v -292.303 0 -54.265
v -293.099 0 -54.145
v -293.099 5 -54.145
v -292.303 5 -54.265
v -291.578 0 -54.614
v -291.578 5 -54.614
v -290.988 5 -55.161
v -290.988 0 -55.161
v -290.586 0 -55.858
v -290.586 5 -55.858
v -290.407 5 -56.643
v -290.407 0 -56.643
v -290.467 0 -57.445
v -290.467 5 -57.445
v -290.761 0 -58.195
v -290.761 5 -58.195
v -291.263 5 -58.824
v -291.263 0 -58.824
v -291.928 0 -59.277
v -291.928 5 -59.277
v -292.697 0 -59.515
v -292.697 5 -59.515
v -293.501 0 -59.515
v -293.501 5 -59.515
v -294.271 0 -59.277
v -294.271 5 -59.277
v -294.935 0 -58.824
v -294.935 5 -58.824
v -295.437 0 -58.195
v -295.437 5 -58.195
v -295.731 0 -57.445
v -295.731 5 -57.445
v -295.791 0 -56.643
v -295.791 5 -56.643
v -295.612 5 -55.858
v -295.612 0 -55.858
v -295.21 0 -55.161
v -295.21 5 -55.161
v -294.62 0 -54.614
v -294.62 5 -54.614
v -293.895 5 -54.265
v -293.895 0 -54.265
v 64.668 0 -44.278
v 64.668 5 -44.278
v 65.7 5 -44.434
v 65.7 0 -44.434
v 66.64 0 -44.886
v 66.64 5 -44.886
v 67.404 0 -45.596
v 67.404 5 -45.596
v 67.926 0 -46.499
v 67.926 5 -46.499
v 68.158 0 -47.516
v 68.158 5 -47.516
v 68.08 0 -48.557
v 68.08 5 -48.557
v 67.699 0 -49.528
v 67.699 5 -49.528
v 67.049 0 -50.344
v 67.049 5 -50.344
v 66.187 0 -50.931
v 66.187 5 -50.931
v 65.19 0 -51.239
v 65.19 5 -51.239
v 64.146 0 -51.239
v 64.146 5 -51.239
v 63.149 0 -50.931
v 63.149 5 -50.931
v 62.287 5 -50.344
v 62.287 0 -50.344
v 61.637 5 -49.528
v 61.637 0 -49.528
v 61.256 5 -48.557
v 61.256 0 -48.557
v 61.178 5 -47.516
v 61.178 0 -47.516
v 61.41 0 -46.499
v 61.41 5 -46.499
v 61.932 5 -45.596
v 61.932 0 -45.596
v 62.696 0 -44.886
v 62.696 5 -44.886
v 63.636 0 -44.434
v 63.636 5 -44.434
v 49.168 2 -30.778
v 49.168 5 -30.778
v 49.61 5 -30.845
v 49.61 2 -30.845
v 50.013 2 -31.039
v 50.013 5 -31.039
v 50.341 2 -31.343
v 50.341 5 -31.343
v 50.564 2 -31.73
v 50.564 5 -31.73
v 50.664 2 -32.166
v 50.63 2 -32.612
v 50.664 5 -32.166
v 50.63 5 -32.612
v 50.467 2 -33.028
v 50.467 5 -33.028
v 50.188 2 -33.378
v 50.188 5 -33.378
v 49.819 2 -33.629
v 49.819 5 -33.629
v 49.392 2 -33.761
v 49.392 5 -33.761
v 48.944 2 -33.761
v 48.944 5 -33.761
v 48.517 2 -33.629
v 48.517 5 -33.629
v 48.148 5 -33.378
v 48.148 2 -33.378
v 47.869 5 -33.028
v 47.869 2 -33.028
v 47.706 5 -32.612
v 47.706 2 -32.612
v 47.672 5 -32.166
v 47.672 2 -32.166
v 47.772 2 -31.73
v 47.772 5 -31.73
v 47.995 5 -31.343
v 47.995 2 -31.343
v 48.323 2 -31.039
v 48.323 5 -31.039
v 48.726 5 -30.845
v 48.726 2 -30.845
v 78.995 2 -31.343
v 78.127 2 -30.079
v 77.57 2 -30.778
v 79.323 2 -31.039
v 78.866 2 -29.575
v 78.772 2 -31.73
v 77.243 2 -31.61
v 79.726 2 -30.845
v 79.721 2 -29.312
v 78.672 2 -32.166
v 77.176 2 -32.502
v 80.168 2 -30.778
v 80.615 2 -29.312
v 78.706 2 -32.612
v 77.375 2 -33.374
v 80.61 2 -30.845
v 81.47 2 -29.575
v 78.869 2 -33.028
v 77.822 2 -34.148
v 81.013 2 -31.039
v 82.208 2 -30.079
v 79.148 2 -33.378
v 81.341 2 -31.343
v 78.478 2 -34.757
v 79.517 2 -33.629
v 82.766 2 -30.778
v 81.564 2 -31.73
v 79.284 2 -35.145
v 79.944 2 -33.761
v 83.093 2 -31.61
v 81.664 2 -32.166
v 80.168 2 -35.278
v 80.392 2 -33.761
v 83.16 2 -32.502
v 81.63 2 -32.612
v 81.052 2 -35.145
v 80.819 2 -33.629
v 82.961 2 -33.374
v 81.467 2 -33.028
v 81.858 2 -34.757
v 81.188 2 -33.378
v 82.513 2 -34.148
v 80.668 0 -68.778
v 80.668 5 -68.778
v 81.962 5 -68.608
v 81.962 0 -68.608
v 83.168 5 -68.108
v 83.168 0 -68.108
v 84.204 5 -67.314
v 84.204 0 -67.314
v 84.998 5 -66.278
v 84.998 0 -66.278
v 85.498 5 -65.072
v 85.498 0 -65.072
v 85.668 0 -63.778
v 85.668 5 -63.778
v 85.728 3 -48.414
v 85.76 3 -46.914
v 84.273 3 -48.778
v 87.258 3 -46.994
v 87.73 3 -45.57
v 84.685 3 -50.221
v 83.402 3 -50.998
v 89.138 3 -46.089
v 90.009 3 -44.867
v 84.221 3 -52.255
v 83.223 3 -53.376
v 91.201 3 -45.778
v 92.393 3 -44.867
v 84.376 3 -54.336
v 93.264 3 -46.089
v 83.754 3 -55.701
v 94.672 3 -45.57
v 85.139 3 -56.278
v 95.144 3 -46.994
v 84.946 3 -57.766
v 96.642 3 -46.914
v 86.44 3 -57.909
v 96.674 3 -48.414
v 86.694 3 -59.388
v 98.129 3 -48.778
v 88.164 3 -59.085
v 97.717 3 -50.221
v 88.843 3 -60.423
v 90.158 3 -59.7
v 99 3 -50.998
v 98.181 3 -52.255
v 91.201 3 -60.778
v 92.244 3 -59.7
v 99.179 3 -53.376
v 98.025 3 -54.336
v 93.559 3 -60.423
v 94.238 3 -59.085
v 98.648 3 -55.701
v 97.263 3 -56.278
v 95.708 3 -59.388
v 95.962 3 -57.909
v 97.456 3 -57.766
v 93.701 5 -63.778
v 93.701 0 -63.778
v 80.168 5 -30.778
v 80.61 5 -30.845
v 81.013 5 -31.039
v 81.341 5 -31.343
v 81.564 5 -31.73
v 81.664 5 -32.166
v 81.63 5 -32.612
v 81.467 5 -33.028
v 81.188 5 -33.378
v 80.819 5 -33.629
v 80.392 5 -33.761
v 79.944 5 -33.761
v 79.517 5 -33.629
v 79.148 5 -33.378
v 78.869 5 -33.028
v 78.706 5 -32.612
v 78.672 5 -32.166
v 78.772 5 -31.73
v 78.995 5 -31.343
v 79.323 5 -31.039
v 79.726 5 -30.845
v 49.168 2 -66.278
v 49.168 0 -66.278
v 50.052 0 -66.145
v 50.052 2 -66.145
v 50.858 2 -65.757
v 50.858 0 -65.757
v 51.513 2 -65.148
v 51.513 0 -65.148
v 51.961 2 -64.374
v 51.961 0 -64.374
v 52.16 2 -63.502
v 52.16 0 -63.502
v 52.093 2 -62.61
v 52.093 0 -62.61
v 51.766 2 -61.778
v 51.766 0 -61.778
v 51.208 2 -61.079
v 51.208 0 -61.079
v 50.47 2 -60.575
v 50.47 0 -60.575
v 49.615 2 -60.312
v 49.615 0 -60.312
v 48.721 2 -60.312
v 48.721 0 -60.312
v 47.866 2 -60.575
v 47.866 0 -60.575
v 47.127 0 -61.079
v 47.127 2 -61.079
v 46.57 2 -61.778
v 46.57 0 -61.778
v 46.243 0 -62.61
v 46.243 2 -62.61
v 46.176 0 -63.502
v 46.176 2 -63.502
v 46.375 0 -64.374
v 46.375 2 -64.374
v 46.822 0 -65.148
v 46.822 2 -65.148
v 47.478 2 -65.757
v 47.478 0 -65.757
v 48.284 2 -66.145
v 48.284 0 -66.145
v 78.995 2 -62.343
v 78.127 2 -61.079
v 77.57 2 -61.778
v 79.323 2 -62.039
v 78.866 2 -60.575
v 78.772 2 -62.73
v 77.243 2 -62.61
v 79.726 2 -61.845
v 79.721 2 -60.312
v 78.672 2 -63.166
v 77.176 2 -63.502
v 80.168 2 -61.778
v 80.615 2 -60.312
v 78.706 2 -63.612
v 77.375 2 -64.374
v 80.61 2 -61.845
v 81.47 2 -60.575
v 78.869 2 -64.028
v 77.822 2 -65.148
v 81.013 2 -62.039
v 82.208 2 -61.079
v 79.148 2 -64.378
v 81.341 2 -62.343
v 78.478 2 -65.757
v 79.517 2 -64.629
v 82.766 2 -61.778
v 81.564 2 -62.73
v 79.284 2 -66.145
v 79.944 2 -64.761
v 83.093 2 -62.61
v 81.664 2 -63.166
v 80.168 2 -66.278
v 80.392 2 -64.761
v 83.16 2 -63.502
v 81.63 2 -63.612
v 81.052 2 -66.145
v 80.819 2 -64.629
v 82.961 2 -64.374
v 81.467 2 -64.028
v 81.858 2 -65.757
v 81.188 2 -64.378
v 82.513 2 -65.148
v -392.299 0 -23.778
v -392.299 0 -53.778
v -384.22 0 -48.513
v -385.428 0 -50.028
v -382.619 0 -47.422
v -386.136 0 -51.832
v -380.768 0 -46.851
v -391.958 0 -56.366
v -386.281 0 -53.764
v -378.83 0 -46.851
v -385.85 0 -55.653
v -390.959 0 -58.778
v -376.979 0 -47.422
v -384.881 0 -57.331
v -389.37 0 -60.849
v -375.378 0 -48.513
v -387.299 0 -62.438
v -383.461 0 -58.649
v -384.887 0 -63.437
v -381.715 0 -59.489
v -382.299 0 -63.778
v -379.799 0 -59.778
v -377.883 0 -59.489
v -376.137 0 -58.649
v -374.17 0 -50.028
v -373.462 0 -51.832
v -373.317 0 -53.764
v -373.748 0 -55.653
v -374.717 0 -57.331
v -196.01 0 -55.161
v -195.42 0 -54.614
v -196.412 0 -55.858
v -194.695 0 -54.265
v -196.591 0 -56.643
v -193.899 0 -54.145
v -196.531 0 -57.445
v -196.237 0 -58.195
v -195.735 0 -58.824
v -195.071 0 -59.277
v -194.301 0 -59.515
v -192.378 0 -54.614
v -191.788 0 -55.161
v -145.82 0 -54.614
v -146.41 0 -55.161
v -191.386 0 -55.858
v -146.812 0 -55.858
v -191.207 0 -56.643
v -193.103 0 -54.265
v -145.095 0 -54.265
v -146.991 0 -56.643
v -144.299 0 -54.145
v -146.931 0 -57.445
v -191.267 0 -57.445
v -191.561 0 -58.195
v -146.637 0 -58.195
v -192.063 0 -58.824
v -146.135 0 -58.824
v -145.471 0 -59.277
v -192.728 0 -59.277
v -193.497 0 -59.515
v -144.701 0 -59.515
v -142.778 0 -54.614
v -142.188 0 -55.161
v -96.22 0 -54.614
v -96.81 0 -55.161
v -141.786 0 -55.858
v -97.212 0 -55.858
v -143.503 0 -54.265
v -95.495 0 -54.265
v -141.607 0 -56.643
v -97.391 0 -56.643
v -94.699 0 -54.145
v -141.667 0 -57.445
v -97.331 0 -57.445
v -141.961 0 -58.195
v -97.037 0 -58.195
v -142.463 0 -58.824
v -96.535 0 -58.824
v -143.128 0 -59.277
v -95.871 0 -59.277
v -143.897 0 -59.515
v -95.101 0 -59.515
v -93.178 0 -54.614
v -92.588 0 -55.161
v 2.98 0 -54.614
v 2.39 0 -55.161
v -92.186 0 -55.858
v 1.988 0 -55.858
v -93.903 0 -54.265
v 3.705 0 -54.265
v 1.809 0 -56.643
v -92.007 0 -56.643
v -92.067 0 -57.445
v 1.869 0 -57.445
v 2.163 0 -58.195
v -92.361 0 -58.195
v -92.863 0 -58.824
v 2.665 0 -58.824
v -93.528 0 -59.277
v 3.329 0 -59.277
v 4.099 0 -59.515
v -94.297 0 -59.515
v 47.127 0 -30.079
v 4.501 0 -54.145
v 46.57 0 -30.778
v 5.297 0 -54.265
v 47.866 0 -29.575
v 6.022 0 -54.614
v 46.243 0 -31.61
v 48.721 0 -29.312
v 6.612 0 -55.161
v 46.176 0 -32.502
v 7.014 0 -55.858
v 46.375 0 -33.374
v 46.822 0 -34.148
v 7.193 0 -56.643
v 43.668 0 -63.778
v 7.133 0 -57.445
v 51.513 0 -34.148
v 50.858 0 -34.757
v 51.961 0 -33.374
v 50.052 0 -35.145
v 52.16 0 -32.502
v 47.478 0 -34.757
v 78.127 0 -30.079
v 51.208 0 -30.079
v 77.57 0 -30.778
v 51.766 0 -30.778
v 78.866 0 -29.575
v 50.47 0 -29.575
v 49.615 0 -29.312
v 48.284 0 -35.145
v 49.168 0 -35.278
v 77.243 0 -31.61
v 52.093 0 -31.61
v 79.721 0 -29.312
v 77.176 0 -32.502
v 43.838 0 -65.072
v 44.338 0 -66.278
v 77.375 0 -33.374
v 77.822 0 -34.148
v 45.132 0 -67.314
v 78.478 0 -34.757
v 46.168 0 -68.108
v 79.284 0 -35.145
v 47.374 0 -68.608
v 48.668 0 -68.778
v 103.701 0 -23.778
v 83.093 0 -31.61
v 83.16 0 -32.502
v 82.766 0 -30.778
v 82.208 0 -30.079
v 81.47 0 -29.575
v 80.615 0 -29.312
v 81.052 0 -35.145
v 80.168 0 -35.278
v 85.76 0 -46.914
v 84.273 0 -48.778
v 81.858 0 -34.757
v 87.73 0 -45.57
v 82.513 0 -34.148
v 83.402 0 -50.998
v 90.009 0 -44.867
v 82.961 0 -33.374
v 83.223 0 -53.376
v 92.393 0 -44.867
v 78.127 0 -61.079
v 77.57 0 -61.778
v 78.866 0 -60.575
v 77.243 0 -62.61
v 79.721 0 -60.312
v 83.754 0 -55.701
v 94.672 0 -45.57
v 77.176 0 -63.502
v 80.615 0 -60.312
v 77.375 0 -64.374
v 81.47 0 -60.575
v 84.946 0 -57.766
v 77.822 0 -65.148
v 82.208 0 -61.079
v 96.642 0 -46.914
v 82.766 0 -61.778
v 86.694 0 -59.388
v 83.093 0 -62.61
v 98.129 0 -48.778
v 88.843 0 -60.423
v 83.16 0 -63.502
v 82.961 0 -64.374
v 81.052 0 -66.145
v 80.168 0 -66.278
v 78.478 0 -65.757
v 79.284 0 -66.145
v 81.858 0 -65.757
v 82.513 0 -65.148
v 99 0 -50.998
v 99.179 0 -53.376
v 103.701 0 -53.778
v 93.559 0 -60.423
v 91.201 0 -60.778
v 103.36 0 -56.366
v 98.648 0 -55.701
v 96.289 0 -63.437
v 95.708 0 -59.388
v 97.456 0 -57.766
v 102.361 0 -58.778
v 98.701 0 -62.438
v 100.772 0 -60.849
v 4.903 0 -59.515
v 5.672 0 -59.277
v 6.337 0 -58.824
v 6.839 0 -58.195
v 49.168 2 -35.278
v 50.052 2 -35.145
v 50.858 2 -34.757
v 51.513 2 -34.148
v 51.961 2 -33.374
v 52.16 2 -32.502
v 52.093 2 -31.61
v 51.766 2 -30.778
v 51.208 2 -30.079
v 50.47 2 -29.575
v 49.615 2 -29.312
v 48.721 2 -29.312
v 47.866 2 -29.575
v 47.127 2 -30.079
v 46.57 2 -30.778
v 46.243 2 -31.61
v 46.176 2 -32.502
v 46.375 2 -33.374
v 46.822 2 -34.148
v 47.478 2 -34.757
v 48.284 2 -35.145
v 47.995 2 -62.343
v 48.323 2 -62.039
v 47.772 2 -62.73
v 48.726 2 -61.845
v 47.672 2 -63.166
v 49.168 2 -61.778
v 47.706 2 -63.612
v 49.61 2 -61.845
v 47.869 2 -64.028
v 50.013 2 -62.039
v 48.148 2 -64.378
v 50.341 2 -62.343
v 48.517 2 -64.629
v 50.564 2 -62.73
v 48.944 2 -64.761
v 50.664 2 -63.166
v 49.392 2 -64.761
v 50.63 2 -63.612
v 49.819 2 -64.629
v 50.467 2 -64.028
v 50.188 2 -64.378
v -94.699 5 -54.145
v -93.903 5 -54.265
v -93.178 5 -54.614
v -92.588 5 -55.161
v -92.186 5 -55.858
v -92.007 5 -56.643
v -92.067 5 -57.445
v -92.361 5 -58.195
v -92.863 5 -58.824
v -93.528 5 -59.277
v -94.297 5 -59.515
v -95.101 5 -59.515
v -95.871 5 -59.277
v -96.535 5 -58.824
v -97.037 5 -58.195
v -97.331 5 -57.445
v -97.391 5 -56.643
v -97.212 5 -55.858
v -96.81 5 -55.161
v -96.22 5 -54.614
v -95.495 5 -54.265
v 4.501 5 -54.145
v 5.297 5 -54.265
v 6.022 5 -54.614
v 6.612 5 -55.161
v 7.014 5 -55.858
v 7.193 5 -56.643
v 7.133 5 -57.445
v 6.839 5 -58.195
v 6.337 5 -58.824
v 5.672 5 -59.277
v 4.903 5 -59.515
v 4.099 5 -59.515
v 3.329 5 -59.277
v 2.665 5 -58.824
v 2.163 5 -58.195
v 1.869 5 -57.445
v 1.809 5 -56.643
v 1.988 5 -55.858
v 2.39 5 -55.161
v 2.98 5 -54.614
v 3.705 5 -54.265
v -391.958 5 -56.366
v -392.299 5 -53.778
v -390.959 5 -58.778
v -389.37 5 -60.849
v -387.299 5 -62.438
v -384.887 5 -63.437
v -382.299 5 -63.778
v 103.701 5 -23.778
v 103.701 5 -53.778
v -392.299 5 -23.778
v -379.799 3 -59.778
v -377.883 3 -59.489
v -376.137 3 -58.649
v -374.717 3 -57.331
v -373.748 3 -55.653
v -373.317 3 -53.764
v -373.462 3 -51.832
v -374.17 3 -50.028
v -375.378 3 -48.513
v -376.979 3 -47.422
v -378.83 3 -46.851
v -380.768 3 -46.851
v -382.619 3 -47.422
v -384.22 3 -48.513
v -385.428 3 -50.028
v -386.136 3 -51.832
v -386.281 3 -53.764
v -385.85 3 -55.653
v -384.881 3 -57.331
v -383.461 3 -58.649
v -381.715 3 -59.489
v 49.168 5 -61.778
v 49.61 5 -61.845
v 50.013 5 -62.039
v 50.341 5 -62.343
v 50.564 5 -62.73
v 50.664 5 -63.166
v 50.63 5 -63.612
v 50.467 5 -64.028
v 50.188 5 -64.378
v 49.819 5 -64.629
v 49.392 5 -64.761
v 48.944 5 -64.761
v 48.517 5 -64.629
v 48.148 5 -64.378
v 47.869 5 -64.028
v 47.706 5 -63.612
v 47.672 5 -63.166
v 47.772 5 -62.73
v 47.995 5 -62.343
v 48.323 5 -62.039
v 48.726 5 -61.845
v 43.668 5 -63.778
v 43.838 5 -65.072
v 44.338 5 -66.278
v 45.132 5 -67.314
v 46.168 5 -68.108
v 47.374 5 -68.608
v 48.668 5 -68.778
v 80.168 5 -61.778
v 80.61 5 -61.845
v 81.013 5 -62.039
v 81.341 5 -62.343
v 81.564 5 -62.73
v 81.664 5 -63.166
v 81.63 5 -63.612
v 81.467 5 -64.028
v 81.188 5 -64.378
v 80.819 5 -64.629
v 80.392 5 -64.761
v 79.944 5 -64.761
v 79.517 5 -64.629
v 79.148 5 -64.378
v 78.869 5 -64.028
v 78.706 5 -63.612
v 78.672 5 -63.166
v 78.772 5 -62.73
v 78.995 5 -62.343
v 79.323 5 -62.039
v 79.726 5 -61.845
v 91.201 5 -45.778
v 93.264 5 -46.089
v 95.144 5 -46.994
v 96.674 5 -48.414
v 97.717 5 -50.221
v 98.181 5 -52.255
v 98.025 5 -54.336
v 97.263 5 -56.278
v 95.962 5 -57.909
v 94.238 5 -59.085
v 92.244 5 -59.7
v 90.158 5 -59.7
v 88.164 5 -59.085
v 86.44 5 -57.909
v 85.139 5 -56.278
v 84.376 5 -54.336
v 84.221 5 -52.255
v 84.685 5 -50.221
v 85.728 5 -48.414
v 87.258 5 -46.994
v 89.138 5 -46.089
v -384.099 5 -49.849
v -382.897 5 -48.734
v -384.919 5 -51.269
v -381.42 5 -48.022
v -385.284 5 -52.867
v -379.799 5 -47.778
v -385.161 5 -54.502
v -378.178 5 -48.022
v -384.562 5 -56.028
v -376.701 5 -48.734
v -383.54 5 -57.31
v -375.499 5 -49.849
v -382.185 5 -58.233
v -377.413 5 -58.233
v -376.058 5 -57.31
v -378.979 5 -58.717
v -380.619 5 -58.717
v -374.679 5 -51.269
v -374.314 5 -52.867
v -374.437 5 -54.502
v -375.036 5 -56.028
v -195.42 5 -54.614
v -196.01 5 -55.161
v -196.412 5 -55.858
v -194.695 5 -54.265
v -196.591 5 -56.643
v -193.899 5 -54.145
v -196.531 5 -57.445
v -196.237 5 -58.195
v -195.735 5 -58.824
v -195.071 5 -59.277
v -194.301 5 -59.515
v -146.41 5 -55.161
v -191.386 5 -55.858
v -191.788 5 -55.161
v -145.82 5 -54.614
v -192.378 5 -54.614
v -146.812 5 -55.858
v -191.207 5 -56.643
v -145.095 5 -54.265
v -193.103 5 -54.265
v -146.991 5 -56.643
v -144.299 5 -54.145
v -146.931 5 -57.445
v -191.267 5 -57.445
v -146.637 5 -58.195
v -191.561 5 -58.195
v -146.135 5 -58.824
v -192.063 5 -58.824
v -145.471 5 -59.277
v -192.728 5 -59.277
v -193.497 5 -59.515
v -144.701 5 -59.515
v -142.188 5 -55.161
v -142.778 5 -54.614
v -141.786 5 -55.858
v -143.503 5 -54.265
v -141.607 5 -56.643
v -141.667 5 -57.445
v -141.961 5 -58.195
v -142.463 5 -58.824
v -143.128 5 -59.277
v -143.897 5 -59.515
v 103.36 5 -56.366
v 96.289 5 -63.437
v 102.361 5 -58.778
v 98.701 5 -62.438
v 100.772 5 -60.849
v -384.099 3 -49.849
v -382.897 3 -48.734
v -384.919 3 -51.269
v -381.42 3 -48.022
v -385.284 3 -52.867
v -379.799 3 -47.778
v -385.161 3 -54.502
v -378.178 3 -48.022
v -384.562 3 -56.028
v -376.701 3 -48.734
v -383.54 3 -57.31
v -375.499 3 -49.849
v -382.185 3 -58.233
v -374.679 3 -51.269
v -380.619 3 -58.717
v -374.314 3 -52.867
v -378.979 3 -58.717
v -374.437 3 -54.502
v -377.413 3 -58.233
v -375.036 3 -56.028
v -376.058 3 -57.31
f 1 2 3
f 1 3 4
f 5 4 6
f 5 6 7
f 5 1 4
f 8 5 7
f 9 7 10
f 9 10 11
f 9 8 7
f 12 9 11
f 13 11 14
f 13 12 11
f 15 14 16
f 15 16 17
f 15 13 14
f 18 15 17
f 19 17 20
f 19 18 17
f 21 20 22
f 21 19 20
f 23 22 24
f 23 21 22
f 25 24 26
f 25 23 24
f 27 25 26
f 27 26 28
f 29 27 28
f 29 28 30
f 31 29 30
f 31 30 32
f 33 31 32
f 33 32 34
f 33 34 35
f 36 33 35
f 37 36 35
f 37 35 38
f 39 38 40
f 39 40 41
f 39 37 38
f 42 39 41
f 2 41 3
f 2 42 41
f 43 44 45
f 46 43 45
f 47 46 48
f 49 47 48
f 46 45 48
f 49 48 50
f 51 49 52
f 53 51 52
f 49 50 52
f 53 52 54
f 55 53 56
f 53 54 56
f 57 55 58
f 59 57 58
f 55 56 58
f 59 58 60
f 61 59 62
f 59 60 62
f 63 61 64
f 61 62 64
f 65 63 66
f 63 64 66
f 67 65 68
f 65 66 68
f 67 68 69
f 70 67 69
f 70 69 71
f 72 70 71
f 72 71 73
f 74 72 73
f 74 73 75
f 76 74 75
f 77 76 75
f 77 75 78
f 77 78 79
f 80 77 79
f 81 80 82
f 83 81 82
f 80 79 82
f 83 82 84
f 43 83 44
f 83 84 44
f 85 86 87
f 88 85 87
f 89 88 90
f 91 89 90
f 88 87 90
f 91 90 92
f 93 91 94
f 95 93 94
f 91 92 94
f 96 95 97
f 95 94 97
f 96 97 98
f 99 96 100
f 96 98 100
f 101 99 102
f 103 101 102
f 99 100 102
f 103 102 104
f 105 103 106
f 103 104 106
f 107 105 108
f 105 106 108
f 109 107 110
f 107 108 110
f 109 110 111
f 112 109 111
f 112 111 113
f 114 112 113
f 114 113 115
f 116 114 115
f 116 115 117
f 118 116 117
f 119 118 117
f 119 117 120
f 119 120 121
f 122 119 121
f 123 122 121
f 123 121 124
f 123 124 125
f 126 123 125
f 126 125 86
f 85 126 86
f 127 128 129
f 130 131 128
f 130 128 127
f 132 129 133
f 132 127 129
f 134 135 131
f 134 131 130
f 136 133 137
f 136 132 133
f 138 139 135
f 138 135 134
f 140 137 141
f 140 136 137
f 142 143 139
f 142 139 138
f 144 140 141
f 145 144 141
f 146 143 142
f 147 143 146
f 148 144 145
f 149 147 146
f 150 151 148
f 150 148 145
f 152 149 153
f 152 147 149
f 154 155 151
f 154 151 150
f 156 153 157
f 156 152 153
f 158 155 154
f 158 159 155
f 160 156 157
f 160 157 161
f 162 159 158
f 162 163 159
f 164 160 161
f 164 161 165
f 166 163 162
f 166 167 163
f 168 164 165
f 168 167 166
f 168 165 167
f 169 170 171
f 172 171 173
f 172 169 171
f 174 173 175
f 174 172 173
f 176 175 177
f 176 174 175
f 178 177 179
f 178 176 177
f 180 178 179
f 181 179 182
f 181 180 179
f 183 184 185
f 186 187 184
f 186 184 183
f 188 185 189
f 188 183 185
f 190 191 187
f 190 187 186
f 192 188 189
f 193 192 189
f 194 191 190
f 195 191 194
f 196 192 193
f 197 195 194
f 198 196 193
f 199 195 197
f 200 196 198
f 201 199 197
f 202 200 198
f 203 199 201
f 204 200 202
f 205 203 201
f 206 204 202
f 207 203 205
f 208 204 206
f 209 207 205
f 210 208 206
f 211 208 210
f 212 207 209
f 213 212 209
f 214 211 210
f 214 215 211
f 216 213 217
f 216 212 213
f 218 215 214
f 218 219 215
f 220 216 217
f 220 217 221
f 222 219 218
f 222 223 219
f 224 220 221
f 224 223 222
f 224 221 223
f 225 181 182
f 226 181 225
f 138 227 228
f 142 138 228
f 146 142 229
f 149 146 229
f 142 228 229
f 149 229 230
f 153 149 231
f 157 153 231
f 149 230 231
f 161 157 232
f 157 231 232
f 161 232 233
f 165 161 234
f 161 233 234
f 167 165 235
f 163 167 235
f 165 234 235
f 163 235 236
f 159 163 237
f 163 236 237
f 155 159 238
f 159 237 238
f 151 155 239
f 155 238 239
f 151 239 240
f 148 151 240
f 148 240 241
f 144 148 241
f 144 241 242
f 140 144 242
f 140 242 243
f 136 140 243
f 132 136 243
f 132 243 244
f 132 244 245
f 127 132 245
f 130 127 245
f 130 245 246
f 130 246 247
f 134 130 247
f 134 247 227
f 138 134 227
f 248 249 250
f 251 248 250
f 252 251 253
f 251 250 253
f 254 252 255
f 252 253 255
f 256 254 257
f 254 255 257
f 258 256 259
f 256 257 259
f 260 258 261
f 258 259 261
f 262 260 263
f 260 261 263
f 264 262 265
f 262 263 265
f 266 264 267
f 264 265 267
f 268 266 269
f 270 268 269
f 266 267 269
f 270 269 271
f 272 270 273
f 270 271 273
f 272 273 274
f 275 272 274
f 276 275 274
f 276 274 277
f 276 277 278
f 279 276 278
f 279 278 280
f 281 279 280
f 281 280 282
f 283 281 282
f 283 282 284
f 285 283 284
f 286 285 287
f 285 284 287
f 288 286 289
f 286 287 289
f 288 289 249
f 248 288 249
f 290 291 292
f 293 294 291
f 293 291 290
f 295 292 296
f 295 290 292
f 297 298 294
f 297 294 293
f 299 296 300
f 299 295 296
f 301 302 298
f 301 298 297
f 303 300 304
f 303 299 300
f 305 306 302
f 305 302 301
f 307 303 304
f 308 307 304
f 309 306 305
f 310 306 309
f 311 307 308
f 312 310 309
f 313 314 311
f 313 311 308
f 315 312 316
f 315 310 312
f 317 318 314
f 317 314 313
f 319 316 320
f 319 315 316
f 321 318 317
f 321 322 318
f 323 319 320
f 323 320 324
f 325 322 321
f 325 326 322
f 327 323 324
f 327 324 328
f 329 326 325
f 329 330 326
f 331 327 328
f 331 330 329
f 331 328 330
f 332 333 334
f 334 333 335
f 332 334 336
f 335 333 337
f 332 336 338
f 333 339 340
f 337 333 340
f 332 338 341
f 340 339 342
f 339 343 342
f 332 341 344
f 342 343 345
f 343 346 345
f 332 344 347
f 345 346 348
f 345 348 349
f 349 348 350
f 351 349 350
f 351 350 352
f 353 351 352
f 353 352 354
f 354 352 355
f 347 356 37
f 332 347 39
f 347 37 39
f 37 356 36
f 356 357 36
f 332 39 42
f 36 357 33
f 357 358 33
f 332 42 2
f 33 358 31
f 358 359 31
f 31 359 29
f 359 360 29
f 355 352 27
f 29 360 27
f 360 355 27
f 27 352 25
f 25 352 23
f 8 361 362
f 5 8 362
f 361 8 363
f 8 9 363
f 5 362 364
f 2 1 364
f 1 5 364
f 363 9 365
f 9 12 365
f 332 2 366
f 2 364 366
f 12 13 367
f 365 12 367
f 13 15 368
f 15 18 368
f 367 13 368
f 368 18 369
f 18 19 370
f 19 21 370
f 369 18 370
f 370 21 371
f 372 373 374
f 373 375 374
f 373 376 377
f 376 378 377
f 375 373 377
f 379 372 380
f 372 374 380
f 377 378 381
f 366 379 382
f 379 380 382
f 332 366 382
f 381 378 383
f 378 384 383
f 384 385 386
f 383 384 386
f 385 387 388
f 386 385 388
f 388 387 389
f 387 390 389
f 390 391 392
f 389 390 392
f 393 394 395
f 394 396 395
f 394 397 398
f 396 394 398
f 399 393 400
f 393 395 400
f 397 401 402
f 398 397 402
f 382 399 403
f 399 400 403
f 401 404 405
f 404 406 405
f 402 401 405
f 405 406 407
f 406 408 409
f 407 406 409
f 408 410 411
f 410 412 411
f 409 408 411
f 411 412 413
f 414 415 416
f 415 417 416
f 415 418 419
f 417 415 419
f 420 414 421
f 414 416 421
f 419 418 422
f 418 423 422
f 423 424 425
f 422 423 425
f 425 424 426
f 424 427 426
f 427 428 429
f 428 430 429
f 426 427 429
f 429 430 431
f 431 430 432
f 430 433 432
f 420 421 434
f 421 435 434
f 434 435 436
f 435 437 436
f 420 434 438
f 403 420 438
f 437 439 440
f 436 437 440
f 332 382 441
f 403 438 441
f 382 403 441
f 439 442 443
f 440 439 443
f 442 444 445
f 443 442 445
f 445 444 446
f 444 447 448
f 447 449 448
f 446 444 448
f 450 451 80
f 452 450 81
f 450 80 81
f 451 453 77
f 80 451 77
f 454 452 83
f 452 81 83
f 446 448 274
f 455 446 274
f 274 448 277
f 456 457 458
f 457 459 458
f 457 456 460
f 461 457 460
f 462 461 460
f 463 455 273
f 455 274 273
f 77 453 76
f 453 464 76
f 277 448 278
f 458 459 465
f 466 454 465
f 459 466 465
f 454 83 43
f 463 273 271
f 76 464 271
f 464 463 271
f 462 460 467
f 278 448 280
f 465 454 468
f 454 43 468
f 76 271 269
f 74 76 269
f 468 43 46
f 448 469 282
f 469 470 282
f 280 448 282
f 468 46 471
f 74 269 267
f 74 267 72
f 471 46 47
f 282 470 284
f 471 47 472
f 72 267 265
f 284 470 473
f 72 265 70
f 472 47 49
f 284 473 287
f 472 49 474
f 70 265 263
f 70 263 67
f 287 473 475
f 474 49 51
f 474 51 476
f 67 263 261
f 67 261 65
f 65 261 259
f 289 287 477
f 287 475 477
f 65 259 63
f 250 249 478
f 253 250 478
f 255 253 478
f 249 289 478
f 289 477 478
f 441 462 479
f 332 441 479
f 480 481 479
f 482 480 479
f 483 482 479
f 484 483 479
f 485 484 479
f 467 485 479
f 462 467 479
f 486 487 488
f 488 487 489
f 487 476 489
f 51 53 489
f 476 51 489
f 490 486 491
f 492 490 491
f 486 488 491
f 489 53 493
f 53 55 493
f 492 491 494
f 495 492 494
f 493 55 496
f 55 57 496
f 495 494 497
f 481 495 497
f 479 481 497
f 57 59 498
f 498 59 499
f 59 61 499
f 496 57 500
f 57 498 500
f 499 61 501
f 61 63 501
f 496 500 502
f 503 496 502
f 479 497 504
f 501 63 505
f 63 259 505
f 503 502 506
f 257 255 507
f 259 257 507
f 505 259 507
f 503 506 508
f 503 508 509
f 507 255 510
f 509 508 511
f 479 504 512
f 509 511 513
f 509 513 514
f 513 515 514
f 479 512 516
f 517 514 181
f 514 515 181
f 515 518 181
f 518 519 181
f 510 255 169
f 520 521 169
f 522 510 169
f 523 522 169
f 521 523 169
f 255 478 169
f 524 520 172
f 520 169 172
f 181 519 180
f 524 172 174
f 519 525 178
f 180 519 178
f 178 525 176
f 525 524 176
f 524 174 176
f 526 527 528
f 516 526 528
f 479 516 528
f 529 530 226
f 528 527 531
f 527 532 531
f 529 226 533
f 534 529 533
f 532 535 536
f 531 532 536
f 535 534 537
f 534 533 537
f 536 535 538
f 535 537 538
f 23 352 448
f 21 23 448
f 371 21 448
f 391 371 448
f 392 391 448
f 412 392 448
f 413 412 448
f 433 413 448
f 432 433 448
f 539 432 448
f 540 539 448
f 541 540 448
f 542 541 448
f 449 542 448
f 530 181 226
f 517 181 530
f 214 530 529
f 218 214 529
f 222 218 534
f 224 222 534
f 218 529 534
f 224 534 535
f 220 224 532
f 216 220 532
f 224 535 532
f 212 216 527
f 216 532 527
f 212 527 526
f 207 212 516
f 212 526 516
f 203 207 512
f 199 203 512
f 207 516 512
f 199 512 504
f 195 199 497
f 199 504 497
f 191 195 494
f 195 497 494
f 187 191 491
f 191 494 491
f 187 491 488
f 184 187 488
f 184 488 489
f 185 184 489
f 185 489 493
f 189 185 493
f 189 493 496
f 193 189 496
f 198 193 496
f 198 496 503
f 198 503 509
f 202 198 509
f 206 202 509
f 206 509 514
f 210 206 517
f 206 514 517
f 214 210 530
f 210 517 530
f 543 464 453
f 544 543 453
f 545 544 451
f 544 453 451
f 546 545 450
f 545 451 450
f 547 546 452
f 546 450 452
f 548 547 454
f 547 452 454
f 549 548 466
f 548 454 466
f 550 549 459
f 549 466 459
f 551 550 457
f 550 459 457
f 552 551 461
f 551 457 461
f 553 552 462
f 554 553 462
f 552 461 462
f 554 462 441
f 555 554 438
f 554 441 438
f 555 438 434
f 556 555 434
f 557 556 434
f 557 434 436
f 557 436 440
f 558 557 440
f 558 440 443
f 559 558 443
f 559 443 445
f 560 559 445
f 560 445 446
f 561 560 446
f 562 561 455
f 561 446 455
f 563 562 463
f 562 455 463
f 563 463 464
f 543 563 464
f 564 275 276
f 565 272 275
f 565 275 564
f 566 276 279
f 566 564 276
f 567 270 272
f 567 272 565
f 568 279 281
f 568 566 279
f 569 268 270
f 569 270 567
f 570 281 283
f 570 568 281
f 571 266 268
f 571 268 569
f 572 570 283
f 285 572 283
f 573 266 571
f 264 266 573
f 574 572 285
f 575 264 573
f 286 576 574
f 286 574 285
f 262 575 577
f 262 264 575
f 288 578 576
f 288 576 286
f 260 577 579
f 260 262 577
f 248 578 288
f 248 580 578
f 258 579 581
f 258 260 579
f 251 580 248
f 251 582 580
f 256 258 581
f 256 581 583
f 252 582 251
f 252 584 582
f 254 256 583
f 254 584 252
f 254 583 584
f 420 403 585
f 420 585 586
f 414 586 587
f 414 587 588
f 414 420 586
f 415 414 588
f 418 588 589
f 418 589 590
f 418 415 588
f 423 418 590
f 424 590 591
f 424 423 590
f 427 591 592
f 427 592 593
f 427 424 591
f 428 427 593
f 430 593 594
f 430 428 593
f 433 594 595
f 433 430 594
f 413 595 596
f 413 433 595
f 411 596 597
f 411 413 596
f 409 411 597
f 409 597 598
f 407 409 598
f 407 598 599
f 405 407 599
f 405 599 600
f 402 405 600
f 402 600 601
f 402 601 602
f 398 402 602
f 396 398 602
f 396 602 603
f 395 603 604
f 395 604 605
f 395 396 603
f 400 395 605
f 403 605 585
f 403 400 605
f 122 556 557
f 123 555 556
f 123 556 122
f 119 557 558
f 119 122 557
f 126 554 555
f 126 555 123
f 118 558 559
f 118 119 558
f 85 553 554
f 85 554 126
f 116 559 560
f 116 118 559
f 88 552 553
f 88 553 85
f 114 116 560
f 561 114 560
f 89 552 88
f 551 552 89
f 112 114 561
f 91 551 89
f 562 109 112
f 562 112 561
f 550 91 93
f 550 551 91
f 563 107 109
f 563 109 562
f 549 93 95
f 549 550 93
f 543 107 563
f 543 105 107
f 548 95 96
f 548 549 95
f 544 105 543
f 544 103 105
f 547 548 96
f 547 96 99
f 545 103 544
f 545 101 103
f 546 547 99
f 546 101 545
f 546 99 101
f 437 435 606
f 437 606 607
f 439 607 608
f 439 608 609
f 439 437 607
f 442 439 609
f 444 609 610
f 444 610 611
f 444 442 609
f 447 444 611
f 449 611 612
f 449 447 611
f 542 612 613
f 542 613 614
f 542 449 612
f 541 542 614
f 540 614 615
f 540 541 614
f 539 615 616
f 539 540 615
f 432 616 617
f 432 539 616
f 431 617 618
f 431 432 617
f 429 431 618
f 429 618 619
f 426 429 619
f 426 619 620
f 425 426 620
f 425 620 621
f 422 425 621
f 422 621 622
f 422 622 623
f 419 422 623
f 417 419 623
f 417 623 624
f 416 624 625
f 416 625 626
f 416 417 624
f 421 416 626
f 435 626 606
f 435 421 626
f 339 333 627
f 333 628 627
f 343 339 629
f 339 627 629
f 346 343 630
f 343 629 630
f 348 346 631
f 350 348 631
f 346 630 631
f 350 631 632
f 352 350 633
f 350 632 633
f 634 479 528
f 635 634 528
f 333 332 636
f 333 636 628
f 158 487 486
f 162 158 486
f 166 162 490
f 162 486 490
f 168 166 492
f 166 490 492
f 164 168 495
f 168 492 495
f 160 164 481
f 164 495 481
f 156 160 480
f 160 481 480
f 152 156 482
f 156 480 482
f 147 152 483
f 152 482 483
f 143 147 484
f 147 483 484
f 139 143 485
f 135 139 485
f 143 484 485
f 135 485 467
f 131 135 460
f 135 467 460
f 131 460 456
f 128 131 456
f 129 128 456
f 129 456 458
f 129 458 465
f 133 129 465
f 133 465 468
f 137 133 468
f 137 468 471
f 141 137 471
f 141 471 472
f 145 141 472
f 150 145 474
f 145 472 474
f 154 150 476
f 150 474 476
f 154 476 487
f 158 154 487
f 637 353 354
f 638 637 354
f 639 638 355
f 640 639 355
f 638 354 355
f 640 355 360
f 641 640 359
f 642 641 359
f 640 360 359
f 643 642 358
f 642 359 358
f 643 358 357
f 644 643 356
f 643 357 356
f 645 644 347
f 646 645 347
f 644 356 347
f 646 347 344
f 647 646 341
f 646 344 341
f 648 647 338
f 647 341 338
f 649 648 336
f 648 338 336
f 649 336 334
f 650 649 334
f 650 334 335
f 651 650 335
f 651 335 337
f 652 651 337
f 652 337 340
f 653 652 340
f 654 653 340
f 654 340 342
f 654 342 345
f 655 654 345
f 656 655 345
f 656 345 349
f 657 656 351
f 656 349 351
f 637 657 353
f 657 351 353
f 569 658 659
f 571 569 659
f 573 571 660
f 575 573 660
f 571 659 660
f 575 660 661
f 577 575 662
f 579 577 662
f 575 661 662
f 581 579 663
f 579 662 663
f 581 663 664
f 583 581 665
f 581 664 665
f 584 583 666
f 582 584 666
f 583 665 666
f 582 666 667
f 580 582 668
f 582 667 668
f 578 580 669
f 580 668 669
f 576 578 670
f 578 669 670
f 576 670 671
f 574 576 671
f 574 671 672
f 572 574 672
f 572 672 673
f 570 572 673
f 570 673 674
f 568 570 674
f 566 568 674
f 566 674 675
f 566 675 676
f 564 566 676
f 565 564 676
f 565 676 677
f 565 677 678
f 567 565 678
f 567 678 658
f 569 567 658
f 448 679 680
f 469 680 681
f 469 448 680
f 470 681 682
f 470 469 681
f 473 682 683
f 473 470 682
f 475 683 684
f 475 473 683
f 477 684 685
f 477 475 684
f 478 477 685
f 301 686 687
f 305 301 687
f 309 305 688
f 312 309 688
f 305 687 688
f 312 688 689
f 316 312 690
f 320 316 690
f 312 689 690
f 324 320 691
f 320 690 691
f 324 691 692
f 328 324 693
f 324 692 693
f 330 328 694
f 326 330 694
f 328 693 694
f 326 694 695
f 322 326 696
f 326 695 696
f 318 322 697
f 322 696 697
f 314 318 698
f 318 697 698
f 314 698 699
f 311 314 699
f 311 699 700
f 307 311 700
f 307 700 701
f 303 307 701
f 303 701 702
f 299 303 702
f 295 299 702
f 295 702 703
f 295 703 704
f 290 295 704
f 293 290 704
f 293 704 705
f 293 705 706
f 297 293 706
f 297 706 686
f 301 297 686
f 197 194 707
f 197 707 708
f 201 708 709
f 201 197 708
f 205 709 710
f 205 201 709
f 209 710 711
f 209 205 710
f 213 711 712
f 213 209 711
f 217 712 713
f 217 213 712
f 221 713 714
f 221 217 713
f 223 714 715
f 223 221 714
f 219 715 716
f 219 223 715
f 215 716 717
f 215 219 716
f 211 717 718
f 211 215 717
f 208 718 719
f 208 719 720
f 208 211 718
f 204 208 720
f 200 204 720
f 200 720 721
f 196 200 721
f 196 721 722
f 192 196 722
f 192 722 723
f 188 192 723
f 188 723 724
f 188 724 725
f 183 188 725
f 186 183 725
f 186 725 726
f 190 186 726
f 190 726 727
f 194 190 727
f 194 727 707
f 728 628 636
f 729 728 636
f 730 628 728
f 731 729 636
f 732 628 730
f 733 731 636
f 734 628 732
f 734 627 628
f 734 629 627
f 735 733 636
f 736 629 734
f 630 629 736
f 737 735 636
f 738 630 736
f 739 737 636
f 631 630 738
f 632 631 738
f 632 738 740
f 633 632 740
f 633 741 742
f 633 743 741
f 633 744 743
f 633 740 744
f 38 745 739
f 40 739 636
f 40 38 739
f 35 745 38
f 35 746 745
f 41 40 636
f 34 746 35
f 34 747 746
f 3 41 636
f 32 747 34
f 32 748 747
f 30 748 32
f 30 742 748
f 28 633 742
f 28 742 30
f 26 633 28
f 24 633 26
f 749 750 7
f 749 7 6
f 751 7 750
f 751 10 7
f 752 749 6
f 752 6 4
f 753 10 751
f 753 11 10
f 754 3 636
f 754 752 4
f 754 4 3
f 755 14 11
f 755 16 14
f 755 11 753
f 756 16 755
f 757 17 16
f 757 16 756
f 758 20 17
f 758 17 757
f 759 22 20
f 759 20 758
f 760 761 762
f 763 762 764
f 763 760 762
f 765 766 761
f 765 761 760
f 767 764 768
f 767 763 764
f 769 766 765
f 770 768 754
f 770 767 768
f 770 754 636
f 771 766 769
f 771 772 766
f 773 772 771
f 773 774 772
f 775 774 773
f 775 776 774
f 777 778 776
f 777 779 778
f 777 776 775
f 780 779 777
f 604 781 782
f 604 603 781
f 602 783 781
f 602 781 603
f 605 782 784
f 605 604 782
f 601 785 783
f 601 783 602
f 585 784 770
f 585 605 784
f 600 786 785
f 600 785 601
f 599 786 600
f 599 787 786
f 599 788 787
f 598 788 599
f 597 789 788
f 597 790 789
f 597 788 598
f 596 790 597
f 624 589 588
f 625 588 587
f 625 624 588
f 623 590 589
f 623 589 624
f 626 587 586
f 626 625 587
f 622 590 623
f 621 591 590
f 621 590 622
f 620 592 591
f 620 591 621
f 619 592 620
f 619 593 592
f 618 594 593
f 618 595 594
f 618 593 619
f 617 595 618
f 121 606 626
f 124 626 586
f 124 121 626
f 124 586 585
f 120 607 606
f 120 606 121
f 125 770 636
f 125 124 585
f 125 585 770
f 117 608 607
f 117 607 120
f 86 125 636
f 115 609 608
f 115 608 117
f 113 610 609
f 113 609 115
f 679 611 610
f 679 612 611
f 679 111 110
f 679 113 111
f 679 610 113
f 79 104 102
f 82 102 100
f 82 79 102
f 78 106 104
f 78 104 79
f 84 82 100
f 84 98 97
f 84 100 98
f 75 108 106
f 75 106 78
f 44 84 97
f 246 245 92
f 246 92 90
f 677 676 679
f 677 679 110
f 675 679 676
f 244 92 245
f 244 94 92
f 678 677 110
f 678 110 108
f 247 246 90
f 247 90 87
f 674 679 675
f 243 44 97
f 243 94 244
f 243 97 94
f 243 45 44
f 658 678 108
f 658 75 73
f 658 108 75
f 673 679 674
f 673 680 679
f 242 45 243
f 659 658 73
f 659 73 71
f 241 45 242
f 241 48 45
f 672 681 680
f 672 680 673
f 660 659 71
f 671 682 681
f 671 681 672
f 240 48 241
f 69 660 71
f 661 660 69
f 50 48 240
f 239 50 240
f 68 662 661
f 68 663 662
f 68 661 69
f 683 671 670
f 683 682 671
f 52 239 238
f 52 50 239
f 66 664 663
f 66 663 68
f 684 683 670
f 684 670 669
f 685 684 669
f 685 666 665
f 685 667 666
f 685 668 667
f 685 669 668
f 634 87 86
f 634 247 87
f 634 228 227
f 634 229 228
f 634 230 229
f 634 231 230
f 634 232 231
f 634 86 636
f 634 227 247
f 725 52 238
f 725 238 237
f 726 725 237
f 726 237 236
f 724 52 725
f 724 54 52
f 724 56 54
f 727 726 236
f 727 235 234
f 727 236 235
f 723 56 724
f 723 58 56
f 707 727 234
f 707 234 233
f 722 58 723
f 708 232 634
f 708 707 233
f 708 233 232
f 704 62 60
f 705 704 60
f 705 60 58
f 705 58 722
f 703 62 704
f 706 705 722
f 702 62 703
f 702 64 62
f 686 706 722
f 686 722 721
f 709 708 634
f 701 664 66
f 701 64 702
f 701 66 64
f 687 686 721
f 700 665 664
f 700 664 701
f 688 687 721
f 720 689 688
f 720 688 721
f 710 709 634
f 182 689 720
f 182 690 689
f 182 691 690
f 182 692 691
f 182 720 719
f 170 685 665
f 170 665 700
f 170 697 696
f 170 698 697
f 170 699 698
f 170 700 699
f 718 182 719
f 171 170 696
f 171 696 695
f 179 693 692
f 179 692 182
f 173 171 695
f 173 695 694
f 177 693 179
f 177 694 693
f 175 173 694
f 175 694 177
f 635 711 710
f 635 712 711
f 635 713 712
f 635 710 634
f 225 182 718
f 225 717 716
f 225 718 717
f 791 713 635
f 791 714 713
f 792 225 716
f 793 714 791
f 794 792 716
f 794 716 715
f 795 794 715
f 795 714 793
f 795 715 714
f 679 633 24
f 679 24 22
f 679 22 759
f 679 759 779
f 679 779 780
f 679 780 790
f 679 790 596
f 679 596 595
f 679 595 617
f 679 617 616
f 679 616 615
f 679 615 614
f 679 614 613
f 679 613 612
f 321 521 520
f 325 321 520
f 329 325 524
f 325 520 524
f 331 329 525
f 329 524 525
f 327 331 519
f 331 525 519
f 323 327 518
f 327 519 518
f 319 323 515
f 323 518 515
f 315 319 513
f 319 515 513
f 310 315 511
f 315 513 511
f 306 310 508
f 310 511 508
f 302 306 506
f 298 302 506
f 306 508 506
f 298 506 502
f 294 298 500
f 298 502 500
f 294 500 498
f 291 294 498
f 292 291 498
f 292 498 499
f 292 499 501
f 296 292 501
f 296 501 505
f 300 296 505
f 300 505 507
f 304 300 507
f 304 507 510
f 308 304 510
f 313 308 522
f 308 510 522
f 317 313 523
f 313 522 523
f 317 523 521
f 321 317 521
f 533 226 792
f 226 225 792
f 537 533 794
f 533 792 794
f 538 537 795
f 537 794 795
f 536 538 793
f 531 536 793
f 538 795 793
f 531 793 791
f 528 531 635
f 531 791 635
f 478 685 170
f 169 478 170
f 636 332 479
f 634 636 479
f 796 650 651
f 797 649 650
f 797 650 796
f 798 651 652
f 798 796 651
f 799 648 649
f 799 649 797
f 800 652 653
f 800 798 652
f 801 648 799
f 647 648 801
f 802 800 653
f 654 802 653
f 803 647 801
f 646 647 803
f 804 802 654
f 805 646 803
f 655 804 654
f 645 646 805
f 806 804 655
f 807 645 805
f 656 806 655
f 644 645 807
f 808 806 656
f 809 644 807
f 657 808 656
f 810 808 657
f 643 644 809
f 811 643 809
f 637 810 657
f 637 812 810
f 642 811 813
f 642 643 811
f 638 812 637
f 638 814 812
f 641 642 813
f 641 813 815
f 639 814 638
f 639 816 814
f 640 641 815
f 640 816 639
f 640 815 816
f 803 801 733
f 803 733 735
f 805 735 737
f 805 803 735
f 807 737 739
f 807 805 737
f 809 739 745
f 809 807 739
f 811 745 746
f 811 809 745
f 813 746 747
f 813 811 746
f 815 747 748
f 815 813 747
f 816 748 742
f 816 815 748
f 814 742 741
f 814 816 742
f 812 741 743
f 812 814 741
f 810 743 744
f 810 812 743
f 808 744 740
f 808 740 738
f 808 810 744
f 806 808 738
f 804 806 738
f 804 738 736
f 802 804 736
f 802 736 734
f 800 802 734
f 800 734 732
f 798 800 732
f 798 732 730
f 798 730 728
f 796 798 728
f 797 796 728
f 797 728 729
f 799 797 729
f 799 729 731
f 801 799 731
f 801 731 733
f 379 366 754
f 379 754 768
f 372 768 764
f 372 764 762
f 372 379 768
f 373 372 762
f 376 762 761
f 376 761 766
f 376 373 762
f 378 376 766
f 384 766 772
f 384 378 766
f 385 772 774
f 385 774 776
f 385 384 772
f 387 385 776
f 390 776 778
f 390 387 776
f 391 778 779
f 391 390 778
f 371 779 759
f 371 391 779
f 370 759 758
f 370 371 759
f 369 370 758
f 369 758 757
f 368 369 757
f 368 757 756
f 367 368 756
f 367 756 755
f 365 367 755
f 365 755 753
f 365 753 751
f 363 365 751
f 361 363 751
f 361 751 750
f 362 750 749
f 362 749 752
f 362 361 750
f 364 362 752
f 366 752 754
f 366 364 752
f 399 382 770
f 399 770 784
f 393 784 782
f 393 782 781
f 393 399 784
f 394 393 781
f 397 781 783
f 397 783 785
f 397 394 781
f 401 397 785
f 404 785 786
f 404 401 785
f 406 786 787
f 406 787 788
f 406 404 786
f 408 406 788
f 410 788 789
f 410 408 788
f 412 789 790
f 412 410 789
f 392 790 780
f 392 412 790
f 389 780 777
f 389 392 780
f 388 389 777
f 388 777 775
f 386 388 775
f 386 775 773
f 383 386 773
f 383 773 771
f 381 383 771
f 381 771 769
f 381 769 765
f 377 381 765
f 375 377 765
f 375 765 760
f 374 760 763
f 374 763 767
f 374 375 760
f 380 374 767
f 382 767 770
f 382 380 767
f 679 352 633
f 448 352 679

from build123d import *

# Parameters (mm, degrees)
SKETCH1_W           = 496
SKETCH1_H           = 40
SKETCH1_R           = 5.5
SKETCH1_R_2         = 7
SKETCH1_R_3         = 2.7
BOSS_EXTRUDE1_DEPTH = 5
SKETCH2_R           = 6.5
SKETCH2_R_2         = 8
CUT_EXTRUDE1_DEPTH  = 3
FILLET1_R           = 10
SKETCH3_W           = 42
SKETCH3_H           = 9.695245244
BOSS_EXTRUDE2_DEPTH = 5
SKETCH5_R           = 3.5
SKETCH5_R_2         = 1.5
CUT_EXTRUDE2_DEPTH  = 5
FILLET2_R           = 5
SKETCH6_R           = 3
CUT_EXTRUDE3_DEPTH  = 2


with BuildPart() as part:
    # Sketch1 → Boss-Extrude1 (new body)
    with BuildSketch(Plane(origin=(0, 0, 0), x_dir=(1, 0, 0), z_dir=(0, 1, 0))):
        with Locations((-144.299026304, 43.778006447)):
            Rectangle(SKETCH1_W, SKETCH1_H)
        with Locations(Location((-379.799026304, 53.278006447, 0), (0, 0, 270))):
            Circle(SKETCH1_R, mode=Mode.SUBTRACT)
        with Locations(Location((91.200973696, 52.778006447, 0), (0, 0, 270))):
            Circle(SKETCH1_R_2, mode=Mode.SUBTRACT)
        with Locations(Location((-293.099026304, 56.844673113, 0), (0, 0, 270))):
            Circle(SKETCH1_R_3, mode=Mode.SUBTRACT)
        with Locations(Location((-193.899026304, 56.844673113, 0), (0, 0, 270))):
            Circle(SKETCH1_R_3, mode=Mode.SUBTRACT)
        with Locations(Location((-94.699026304, 56.844673113, 0), (0, 0, 270))):
            Circle(SKETCH1_R_3, mode=Mode.SUBTRACT)
        with Locations(Location((4.500973696, 56.844673113, 0), (0, 0, 270))):
            Circle(SKETCH1_R_3, mode=Mode.SUBTRACT)
        with Locations(Location((-144.299026304, 56.844673113, 0), (0, 0, 270))):
            Circle(SKETCH1_R_3, mode=Mode.SUBTRACT)
    extrude(amount=BOSS_EXTRUDE1_DEPTH)

    # Sketch2 → Cut-Extrude1 (cut)
    with BuildSketch(Plane.XZ):
        with Locations(Location((-379.799026304, -53.278006447, 0), (0, 0, 270))):
            Circle(SKETCH2_R)
        with Locations(Location((91.200973696, -52.778006447, 0), (0, 0, 270))):
            Circle(SKETCH2_R_2)
    extrude(amount=-CUT_EXTRUDE1_DEPTH, mode=Mode.SUBTRACT)

    # Fillet1
    fillet1_edges = [part.edges().sort_by_distance(p)[0] for p in [
        (-392.299026304, 2.5, -63.778006447),
        (103.700973696, 2.5, -63.778006447),
    ]]
    fillet(fillet1_edges, radius=FILLET1_R)

    # Sketch3 → Boss-Extrude2 (add)
    with BuildSketch(Plane(origin=(0, 5, 0), x_dir=(1, 0, 0), z_dir=(0, 1, 0))):
        with Locations((64.667975373, 63.930383825)):
            Rectangle(SKETCH3_W, SKETCH3_H)
    extrude(amount=-BOSS_EXTRUDE2_DEPTH)

    # Sketch5 → Cut-Extrude2 (cut)
    with BuildSketch(Plane(origin=(0, 5, 0), x_dir=(1, 0, 0), z_dir=(0, 1, 0))):
        with Locations(Location((64.667975373, 47.778006447, 0), (0, 0, 270))):
            Circle(SKETCH5_R)
        with Locations(Location((49.167975373, 63.278006447, 0), (0, 0, 270))):
            Circle(SKETCH5_R_2)
        with Locations(Location((80.167975373, 63.278006447, 0), (0, 0, 270))):
            Circle(SKETCH5_R_2)
        with Locations(Location((80.167975373, 32.278006447, 0), (0, 0, 270))):
            Circle(SKETCH5_R_2)
        with Locations(Location((49.167975373, 32.278006447, 0), (0, 0, 270))):
            Circle(SKETCH5_R_2)
    extrude(amount=-CUT_EXTRUDE2_DEPTH, mode=Mode.SUBTRACT)

    # Fillet2
    fillet2_edges = [part.edges().sort_by_distance(p)[0] for p in [
        (43.667975373, 2.5, -68.778006447),
        (85.667975373, 2.5, -68.778006447),
    ]]
    fillet(fillet2_edges, radius=FILLET2_R - 0.0001)  # a hair under: the kernel refuses the full size

    # Sketch6 → Cut-Extrude3 (cut)
    with BuildSketch(Plane.XZ):
        with Locations(Location((49.167975373, -32.278006447, 0), (0, 0, 270))):
            Circle(SKETCH6_R)
        with Locations(Location((80.167975373, -32.278006447, 0), (0, 0, 270))):
            Circle(SKETCH6_R)
        with Locations(Location((49.167975373, -63.278006447, 0), (0, 0, 270))):
            Circle(SKETCH6_R)
        with Locations(Location((80.167975373, -63.278006447, 0), (0, 0, 270))):
            Circle(SKETCH6_R)
    extrude(amount=-CUT_EXTRUDE3_DEPTH, mode=Mode.SUBTRACT)


solid = part.part
